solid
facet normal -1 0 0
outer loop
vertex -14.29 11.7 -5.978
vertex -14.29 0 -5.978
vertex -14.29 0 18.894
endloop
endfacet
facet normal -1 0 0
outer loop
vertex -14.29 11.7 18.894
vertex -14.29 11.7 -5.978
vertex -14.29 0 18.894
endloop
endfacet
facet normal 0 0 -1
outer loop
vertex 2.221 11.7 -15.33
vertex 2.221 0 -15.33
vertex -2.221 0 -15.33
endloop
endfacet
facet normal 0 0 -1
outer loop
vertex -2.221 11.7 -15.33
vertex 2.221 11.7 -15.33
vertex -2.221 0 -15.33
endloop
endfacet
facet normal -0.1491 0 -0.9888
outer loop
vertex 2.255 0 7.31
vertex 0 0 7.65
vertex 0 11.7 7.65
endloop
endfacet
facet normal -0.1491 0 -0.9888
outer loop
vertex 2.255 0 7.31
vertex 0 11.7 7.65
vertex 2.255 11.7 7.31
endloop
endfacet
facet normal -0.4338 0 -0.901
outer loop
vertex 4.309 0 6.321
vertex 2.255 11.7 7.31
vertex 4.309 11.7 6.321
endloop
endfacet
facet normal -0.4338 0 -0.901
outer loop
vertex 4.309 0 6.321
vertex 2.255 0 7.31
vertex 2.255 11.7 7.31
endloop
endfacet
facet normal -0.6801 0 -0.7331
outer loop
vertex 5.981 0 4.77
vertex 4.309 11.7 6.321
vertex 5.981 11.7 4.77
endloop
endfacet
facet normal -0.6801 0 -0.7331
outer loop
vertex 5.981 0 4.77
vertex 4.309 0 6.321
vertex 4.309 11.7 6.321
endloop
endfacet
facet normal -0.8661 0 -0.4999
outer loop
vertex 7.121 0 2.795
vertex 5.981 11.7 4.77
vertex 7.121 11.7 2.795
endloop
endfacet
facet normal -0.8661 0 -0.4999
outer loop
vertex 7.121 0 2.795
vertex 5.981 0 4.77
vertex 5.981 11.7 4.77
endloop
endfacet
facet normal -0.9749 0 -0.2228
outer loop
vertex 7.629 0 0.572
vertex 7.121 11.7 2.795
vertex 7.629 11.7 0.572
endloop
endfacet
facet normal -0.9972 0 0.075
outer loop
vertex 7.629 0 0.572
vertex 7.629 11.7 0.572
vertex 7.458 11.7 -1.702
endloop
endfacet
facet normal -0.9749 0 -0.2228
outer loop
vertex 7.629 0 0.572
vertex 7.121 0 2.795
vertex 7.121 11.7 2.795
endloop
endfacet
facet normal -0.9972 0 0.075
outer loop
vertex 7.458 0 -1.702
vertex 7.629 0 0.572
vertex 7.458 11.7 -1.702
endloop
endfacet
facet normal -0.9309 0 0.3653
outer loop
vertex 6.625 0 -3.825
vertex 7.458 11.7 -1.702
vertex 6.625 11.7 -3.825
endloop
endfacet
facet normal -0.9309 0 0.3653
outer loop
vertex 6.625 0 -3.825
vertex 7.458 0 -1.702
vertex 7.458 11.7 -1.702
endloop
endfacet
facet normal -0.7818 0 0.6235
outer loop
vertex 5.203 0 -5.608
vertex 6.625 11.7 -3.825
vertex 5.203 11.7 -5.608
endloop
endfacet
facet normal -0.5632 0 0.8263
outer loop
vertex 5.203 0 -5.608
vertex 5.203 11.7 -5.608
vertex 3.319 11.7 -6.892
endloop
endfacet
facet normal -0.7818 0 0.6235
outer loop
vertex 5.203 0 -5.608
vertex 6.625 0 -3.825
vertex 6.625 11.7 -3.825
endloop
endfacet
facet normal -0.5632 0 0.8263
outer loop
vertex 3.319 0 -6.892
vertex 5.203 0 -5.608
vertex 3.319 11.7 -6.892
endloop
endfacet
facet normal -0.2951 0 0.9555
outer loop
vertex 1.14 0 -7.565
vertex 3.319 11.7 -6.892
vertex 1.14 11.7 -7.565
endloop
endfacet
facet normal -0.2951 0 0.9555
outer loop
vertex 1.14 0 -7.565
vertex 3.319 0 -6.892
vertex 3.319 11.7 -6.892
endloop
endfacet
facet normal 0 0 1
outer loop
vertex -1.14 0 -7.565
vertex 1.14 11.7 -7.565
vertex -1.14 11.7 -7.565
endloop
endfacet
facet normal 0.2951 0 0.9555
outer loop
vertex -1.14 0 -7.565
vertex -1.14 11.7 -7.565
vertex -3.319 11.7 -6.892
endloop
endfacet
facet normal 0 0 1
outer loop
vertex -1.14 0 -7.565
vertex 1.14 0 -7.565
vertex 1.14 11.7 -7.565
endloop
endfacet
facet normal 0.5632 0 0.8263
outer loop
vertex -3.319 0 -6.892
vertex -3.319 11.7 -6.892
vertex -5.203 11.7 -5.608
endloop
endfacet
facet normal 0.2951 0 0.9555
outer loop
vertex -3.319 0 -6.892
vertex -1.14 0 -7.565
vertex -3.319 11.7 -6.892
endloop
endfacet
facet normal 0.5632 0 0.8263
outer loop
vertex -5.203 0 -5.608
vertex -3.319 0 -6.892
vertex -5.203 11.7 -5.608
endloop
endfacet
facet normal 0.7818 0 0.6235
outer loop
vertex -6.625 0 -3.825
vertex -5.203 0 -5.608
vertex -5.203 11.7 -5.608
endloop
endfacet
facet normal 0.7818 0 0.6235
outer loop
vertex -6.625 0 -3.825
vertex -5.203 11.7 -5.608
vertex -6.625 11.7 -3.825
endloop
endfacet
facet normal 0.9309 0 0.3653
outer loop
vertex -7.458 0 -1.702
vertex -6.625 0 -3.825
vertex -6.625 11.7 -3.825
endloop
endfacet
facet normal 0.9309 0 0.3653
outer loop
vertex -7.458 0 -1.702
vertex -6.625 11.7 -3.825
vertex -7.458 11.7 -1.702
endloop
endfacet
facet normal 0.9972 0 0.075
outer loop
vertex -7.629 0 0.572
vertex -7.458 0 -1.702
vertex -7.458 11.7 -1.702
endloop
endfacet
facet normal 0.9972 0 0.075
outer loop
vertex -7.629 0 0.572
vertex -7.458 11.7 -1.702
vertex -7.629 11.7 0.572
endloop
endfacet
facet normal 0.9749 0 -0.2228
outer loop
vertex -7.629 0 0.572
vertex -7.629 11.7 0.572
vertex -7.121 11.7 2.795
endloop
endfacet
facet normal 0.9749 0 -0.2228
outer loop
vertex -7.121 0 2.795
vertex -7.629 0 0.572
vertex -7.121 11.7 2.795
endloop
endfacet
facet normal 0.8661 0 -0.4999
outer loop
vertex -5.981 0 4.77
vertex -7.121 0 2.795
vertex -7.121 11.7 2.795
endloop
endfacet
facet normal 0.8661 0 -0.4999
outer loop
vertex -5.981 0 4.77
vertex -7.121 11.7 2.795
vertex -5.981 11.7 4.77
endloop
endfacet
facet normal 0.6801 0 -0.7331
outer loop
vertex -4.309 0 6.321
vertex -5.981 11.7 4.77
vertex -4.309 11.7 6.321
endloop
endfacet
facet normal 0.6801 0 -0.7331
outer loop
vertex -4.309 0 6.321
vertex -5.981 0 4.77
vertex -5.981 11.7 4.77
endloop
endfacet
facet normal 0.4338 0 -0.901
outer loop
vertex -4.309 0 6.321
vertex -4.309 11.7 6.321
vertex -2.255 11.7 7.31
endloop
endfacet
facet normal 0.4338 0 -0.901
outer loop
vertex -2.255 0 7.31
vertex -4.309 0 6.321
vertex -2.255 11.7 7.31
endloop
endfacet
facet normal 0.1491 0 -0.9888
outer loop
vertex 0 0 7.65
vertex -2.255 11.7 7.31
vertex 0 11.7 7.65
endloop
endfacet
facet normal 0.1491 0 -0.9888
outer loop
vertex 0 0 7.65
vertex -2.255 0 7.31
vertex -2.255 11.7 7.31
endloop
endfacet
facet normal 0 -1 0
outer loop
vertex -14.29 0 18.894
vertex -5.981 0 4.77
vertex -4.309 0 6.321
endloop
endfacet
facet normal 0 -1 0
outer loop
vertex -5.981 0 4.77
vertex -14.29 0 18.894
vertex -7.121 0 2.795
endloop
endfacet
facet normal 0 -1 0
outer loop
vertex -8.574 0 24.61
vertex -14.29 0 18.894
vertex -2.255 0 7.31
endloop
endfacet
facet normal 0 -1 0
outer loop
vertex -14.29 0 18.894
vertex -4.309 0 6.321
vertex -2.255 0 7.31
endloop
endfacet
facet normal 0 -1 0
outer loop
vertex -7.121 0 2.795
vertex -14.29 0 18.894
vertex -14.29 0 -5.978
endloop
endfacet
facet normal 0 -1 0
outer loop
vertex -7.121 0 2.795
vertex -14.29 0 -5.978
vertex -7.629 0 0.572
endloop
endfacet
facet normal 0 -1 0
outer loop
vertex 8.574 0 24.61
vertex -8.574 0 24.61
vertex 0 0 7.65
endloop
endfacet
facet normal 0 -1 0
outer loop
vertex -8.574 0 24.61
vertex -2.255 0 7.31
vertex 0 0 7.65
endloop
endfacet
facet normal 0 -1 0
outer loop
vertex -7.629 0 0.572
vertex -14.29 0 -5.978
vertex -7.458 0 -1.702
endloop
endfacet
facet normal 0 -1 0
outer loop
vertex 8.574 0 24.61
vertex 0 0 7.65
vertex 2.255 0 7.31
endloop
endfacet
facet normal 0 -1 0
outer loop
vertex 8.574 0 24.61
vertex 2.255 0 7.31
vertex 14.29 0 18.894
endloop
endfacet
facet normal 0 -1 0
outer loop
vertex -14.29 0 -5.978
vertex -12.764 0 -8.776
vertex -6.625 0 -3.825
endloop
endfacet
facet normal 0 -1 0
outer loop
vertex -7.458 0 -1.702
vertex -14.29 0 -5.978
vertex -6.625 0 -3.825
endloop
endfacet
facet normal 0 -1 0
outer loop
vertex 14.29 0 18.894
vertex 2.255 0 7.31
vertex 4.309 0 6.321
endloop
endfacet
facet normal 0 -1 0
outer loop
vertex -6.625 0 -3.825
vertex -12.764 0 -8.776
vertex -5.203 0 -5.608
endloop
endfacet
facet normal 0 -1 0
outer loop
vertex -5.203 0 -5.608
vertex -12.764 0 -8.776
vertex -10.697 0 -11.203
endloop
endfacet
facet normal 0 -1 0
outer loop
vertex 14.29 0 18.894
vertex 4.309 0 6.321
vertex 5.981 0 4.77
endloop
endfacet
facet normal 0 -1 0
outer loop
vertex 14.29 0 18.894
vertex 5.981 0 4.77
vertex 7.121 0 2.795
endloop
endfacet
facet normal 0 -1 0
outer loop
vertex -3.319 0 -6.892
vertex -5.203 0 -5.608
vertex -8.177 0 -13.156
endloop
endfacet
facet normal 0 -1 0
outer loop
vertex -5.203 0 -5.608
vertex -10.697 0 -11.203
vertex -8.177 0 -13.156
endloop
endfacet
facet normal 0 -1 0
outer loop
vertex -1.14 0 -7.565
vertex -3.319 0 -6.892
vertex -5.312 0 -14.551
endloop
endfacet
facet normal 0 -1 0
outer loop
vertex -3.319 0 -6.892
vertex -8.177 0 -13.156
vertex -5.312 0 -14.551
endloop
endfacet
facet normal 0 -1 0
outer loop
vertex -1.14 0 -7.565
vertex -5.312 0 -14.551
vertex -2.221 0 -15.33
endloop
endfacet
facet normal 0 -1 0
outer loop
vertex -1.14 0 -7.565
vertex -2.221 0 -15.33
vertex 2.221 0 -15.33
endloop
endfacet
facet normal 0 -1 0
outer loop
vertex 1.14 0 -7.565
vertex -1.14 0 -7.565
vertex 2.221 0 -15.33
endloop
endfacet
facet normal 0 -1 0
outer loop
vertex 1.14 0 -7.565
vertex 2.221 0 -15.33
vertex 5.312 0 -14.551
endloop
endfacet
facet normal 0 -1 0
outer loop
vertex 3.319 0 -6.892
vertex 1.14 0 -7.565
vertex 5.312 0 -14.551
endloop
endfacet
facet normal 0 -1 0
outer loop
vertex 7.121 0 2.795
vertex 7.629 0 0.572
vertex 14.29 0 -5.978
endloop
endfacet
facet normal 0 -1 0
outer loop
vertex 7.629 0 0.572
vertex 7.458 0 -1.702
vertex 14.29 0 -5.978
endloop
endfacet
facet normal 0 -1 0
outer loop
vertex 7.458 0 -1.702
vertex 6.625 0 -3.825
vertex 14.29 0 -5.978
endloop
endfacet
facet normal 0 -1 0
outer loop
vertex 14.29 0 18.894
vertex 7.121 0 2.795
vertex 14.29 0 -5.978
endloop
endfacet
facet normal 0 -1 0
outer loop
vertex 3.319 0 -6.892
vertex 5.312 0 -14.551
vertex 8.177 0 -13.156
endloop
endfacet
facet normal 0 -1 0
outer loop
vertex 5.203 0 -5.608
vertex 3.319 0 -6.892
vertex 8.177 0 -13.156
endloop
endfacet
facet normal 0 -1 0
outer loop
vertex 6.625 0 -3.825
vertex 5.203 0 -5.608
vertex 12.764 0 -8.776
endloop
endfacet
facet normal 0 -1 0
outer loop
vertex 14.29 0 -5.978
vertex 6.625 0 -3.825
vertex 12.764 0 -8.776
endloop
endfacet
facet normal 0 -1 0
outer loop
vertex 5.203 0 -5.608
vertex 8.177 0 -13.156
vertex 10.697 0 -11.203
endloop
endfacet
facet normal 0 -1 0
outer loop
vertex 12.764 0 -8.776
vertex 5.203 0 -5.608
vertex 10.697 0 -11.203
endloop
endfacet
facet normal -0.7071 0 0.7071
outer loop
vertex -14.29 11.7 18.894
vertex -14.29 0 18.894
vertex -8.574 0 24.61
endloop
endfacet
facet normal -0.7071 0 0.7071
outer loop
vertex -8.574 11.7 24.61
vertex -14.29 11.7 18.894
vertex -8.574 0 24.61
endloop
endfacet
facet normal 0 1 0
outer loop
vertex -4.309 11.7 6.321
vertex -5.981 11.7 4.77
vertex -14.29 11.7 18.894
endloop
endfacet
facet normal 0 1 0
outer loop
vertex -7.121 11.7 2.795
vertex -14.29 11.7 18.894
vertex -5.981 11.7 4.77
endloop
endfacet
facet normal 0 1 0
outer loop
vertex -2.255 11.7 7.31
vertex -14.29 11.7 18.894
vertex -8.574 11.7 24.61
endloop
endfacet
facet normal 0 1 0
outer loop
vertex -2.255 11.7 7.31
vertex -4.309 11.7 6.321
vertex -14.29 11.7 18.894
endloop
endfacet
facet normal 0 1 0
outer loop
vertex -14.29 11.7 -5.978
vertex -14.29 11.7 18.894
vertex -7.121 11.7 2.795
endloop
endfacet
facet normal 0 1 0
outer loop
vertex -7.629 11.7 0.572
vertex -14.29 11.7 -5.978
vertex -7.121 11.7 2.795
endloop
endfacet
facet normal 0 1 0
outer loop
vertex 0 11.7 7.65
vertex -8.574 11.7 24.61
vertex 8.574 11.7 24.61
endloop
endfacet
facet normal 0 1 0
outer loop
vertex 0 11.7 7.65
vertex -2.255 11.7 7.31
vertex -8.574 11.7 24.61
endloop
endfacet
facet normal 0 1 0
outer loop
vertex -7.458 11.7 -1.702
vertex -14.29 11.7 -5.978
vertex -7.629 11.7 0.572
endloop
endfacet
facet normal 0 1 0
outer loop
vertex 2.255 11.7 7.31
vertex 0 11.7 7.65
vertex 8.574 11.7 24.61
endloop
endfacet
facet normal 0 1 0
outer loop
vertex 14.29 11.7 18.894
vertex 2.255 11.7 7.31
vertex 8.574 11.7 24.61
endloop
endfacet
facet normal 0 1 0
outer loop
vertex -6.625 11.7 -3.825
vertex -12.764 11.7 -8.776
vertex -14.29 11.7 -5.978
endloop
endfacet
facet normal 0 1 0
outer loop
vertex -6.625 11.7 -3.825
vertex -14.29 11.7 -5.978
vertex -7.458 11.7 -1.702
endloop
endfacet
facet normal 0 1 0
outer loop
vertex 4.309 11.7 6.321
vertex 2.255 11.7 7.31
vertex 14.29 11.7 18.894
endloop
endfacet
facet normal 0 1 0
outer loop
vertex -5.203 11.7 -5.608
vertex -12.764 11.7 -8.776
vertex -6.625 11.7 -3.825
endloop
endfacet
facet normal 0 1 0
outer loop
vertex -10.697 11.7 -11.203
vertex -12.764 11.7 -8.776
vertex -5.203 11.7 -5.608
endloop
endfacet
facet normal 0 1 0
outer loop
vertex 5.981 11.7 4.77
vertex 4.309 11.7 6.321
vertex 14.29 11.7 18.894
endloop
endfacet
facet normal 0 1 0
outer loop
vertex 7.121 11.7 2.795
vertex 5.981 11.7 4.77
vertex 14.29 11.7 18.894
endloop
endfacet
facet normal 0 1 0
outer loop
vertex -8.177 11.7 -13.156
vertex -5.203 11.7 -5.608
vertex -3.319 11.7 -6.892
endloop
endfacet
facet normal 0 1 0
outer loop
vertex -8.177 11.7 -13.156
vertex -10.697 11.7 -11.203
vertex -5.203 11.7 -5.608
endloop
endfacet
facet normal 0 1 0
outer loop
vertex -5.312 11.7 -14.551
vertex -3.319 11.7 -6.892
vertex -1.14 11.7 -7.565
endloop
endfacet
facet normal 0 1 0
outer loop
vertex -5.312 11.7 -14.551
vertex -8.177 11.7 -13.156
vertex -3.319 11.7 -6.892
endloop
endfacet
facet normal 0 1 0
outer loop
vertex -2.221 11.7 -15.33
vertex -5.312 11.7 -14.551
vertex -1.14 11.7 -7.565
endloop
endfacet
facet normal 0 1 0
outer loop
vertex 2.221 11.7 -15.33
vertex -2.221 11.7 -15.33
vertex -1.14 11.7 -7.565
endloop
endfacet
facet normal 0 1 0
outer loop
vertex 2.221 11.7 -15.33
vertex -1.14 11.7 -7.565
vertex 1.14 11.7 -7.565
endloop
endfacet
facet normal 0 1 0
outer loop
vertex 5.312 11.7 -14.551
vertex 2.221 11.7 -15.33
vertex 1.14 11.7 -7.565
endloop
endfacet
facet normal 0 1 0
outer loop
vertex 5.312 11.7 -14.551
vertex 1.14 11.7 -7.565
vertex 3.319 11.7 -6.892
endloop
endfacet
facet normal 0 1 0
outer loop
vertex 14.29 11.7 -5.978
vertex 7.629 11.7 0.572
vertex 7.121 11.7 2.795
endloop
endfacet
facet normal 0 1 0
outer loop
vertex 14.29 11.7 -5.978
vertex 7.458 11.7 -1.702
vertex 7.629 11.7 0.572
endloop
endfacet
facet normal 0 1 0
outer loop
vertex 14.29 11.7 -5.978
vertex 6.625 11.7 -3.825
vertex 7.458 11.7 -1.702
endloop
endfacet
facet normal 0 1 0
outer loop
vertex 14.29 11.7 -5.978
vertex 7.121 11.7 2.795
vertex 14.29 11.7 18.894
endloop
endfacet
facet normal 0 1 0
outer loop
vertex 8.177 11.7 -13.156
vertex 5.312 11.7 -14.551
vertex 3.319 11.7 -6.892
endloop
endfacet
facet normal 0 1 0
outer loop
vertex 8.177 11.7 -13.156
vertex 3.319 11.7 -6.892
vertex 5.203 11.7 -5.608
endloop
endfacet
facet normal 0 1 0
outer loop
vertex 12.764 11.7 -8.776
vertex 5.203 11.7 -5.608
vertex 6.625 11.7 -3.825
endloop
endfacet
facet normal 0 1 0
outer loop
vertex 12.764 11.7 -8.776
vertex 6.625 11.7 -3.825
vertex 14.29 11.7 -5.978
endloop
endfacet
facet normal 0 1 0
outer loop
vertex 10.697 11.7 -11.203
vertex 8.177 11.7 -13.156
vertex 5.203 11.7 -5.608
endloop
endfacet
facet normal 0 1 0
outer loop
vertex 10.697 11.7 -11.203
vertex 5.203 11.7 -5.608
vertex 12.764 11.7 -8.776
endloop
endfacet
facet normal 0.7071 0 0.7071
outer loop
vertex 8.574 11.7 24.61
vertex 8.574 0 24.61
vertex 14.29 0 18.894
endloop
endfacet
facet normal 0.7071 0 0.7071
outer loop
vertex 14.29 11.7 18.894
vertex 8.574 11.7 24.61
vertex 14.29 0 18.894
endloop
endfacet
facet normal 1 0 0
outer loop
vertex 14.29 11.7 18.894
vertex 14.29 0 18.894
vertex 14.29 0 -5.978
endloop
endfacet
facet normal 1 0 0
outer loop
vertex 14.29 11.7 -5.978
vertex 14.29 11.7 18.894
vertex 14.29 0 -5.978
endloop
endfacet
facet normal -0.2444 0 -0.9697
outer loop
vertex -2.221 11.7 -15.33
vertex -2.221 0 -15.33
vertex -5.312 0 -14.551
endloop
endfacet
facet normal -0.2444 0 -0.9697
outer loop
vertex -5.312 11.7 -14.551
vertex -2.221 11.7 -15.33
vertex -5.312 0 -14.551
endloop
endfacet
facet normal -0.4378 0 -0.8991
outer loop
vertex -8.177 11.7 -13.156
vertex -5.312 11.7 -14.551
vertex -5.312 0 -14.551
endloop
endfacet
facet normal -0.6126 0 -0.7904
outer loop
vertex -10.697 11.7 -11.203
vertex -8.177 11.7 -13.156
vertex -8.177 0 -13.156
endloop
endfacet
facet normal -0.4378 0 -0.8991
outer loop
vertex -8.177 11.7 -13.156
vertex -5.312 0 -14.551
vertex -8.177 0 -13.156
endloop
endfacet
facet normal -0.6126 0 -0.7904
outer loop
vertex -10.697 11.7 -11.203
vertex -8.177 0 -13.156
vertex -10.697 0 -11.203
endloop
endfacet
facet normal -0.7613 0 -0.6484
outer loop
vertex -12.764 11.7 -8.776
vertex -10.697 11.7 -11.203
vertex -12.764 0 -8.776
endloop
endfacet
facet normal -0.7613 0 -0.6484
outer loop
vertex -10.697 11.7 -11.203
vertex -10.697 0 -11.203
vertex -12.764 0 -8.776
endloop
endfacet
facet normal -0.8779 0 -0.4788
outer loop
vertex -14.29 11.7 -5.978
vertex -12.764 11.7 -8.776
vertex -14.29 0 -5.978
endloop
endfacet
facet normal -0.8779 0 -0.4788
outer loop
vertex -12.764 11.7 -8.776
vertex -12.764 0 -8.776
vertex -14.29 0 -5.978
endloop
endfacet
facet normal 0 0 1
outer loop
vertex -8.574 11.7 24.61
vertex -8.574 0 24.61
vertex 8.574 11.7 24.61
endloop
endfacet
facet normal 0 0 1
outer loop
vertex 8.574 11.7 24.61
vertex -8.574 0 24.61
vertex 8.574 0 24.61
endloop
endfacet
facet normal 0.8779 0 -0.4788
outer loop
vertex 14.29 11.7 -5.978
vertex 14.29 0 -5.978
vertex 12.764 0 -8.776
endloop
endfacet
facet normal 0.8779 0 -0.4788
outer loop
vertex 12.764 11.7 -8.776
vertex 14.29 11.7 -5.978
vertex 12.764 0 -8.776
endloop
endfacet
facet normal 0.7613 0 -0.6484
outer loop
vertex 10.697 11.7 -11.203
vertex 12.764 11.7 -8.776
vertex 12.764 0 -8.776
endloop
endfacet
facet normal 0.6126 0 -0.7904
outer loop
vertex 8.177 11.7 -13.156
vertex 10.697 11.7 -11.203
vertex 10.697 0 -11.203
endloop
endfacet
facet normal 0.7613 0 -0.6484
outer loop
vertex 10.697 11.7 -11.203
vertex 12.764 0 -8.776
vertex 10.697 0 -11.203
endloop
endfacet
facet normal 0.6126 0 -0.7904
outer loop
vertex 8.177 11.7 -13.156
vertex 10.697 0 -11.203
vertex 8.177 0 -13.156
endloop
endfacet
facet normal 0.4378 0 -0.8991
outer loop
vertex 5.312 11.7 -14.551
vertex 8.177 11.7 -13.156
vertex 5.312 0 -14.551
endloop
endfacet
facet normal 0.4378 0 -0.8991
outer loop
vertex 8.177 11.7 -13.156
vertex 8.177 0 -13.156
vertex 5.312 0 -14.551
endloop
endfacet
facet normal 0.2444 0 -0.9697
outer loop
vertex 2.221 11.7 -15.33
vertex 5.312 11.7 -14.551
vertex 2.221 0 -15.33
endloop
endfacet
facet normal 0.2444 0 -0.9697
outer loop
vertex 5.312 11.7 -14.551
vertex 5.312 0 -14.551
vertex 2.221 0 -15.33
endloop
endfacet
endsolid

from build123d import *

# Parameters (mm, degrees)
SKETCH1_R           = 7.65
BOSS_EXTRUDE1_DEPTH = 11.7


with BuildPart() as part:
    # Sketch1 → Boss-Extrude1 (new body)
    with BuildSketch(Plane(origin=(0, 0, 0), x_dir=(1, 0, 0), z_dir=(0, 1, 0))):
        with BuildLine():
            Line((-14.29, 5.977959518), (-14.29, -18.894))
            Line((-14.29, -18.894), (-8.574, -24.61))
            Line((-8.574, -24.61), (8.574, -24.61))
            Line((8.574, -24.61), (14.29, -18.894))
            Line((14.29, -18.894), (14.29, 5.977959518))
            ThreePointArc((14.29, 5.977959518), (9.48764436, 12.244374402), (2.220630541, 15.33))
            Line((2.220630541, 15.33), (-2.220630541, 15.33))
            ThreePointArc((-2.220630541, 15.33), (-9.48764436, 12.244374402), (-14.29, 5.977959518))
        make_face()
        with Locations(Location((0, 0, 0), (0, 0, 270))):
            Circle(SKETCH1_R, mode=Mode.SUBTRACT)
    extrude(amount=BOSS_EXTRUDE1_DEPTH)


solid = part.part
